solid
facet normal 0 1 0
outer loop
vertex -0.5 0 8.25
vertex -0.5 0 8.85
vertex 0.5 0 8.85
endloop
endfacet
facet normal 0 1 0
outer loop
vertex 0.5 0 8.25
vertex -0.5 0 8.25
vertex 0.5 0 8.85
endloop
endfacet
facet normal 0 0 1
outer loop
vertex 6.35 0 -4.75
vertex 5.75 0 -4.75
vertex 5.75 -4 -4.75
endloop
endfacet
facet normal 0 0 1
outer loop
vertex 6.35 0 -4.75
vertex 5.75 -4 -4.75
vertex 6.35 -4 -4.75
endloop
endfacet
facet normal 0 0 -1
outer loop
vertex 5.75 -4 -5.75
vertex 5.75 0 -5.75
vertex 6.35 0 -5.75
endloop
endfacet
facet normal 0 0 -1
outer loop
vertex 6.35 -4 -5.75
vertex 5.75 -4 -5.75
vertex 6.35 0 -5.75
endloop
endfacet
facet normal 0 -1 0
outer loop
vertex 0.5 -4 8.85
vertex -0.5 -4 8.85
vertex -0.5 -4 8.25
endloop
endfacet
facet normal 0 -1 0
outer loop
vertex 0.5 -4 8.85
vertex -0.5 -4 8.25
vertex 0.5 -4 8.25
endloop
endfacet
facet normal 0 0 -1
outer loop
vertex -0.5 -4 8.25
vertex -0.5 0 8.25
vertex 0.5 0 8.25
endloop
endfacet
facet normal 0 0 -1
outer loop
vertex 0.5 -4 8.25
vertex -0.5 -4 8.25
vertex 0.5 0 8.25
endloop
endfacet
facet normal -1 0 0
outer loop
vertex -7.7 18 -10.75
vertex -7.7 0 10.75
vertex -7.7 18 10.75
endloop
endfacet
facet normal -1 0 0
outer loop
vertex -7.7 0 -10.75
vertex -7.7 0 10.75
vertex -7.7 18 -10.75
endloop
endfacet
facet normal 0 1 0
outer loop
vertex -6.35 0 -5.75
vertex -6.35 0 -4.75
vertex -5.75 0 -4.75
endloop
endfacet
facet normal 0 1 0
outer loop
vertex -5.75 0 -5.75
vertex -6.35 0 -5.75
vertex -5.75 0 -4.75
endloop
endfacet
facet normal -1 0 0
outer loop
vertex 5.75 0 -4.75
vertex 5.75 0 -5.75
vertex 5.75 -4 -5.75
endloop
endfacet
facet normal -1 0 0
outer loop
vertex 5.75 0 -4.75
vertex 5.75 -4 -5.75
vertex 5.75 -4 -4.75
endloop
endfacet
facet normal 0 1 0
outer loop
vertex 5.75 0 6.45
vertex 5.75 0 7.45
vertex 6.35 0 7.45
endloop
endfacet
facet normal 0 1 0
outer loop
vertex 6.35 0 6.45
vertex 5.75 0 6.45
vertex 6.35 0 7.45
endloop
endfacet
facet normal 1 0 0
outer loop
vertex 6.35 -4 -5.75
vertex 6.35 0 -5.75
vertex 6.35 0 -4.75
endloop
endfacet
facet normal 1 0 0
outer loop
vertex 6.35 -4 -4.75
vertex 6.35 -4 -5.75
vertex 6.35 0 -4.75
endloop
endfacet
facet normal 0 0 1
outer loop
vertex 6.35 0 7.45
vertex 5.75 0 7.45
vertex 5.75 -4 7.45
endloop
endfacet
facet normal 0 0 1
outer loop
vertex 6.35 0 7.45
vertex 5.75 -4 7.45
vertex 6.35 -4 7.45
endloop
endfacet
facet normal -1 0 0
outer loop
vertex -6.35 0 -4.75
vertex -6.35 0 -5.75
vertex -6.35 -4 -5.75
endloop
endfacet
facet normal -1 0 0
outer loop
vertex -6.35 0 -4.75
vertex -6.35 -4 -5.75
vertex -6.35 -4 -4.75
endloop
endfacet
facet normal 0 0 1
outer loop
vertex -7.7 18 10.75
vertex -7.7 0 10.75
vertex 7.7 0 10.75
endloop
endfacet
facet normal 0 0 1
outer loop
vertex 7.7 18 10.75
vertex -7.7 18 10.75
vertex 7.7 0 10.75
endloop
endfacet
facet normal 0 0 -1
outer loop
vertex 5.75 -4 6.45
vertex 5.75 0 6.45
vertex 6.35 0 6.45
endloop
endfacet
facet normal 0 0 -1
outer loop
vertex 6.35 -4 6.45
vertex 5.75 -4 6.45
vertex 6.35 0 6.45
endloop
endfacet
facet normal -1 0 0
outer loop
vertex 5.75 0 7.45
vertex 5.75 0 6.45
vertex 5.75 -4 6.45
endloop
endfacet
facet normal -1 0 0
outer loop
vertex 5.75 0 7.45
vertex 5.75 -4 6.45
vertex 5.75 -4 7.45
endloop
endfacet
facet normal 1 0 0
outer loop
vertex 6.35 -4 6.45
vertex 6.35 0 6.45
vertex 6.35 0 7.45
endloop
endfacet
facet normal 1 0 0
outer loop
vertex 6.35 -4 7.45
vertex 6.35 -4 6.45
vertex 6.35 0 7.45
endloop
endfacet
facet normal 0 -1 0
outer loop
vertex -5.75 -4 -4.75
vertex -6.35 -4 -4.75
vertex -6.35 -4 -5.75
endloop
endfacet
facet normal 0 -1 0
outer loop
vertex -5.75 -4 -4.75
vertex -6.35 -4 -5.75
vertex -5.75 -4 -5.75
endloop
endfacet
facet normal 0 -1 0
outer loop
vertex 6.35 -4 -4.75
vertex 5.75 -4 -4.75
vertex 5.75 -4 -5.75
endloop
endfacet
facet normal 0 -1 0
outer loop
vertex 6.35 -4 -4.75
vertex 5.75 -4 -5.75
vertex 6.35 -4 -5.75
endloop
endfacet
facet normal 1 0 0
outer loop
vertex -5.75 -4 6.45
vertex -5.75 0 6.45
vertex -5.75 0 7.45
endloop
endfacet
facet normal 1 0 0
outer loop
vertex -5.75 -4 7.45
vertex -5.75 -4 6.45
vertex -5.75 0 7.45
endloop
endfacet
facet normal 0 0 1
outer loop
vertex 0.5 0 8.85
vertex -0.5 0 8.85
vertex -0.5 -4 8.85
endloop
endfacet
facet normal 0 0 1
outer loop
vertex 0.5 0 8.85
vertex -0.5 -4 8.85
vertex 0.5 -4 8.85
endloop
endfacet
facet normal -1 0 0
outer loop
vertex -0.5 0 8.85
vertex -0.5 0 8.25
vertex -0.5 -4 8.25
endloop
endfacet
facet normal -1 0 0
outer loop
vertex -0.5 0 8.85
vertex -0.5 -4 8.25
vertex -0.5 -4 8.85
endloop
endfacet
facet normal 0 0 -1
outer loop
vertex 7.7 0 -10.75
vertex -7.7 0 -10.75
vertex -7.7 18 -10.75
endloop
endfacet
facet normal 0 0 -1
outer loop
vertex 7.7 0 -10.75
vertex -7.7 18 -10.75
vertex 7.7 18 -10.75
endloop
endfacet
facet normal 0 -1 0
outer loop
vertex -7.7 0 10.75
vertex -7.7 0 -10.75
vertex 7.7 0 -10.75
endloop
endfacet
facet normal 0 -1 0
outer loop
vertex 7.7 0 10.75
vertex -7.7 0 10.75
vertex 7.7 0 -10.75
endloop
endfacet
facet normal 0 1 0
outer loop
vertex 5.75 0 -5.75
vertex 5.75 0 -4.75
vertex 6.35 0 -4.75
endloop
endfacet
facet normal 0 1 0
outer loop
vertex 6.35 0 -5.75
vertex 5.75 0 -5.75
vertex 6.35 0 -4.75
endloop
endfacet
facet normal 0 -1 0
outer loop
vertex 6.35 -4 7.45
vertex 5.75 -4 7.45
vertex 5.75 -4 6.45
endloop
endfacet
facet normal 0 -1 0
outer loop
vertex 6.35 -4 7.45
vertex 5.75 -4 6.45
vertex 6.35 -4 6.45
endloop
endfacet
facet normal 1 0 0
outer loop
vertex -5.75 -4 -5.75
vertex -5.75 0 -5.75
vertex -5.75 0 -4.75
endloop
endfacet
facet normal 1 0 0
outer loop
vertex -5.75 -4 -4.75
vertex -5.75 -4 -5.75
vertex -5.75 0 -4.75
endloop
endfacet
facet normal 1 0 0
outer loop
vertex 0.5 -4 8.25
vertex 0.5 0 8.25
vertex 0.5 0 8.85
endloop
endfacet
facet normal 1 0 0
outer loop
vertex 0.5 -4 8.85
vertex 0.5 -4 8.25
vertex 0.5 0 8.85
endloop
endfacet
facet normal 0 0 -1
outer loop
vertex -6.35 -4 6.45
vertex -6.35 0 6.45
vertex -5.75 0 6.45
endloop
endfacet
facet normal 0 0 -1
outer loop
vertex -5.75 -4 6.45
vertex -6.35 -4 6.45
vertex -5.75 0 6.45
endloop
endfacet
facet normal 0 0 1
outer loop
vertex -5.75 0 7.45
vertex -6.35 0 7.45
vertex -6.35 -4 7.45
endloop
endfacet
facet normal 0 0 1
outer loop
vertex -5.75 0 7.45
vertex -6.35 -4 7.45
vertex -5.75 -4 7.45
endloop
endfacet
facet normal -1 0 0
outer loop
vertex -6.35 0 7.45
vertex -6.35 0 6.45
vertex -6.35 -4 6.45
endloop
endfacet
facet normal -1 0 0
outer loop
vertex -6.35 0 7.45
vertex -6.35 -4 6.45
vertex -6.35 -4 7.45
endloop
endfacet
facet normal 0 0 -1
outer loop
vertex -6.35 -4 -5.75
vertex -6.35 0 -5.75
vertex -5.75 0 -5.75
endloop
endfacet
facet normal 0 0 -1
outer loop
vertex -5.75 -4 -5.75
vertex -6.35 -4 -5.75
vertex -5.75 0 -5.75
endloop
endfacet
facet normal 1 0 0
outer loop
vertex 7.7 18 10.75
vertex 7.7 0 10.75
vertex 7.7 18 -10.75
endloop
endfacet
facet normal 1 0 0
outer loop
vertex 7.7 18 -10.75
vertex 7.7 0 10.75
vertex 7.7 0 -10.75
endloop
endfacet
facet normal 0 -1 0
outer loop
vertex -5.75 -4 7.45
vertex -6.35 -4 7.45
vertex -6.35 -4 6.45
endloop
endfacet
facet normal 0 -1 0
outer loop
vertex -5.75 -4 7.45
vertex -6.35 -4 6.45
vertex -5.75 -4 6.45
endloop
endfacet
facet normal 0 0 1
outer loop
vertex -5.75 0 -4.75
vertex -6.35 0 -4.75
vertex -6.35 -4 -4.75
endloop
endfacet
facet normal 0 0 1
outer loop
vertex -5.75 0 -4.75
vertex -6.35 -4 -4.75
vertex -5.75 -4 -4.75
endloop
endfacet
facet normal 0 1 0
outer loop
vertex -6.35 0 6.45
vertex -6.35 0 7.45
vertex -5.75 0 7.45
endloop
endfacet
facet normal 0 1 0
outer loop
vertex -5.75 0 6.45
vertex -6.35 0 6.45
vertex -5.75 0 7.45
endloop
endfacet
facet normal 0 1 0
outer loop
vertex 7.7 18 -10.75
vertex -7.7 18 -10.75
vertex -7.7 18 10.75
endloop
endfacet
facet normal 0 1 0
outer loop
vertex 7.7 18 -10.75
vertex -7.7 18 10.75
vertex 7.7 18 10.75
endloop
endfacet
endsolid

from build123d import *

# Parameters (mm, degrees)
SKETCH1_W             = 15.4
SKETCH1_H             = 21.5
BOSS_EXTRUDE1_DEPTH   = 18
SKETCH2_W             = 0.6
SKETCH2_H             = 1
BOSS_EXTRUDE2_DEPTH   = 4
BOSS_EXTRUDE2_2_DEPTH = 4
SKETCH2_W_2           = 1
SKETCH2_H_2           = 0.6
BOSS_EXTRUDE2_3_DEPTH = 4
BOSS_EXTRUDE2_4_DEPTH = 4
BOSS_EXTRUDE2_5_DEPTH = 4


with BuildPart() as part:
    # Sketch1 → Boss-Extrude1 (new body)
    with BuildSketch(Plane(origin=(0, 0, 0), x_dir=(1, 0, 0), z_dir=(0, 1, 0))):
        Rectangle(SKETCH1_W, SKETCH1_H)
    extrude(amount=BOSS_EXTRUDE1_DEPTH)


with BuildPart() as body_2:
    # Sketch2 → Boss-Extrude2 (new body)
    with BuildSketch(Plane.XZ):
        with Locations((-6.05, -5.25)):
            Rectangle(SKETCH2_W, SKETCH2_H)
    extrude(amount=BOSS_EXTRUDE2_DEPTH)


with BuildPart() as body_3:
    # Sketch2 → Boss-Extrude2 2 (new body)
    with BuildSketch(Plane.XZ):
        with Locations((-6.05, 6.95)):
            Rectangle(SKETCH2_W, SKETCH2_H)
    extrude(amount=BOSS_EXTRUDE2_2_DEPTH)


with BuildPart() as body_4:
    # Sketch2 → Boss-Extrude2 3 (new body)
    with BuildSketch(Plane.XZ):
        with Locations((0, 8.55)):
            Rectangle(SKETCH2_W_2, SKETCH2_H_2)
    extrude(amount=BOSS_EXTRUDE2_3_DEPTH)


with BuildPart() as body_5:
    # Sketch2 → Boss-Extrude2 4 (new body)
    with BuildSketch(Plane.XZ):
        with Locations((6.05, 6.95)):
            Rectangle(SKETCH2_W, SKETCH2_H)
    extrude(amount=BOSS_EXTRUDE2_4_DEPTH)


with BuildPart() as body_6:
    # Sketch2 → Boss-Extrude2 5 (new body)
    with BuildSketch(Plane.XZ):
        with Locations((6.05, -5.25)):
            Rectangle(SKETCH2_W, SKETCH2_H)
    extrude(amount=BOSS_EXTRUDE2_5_DEPTH)


solid = Compound([part.part, body_2.part, body_3.part, body_4.part, body_5.part, body_6.part])
